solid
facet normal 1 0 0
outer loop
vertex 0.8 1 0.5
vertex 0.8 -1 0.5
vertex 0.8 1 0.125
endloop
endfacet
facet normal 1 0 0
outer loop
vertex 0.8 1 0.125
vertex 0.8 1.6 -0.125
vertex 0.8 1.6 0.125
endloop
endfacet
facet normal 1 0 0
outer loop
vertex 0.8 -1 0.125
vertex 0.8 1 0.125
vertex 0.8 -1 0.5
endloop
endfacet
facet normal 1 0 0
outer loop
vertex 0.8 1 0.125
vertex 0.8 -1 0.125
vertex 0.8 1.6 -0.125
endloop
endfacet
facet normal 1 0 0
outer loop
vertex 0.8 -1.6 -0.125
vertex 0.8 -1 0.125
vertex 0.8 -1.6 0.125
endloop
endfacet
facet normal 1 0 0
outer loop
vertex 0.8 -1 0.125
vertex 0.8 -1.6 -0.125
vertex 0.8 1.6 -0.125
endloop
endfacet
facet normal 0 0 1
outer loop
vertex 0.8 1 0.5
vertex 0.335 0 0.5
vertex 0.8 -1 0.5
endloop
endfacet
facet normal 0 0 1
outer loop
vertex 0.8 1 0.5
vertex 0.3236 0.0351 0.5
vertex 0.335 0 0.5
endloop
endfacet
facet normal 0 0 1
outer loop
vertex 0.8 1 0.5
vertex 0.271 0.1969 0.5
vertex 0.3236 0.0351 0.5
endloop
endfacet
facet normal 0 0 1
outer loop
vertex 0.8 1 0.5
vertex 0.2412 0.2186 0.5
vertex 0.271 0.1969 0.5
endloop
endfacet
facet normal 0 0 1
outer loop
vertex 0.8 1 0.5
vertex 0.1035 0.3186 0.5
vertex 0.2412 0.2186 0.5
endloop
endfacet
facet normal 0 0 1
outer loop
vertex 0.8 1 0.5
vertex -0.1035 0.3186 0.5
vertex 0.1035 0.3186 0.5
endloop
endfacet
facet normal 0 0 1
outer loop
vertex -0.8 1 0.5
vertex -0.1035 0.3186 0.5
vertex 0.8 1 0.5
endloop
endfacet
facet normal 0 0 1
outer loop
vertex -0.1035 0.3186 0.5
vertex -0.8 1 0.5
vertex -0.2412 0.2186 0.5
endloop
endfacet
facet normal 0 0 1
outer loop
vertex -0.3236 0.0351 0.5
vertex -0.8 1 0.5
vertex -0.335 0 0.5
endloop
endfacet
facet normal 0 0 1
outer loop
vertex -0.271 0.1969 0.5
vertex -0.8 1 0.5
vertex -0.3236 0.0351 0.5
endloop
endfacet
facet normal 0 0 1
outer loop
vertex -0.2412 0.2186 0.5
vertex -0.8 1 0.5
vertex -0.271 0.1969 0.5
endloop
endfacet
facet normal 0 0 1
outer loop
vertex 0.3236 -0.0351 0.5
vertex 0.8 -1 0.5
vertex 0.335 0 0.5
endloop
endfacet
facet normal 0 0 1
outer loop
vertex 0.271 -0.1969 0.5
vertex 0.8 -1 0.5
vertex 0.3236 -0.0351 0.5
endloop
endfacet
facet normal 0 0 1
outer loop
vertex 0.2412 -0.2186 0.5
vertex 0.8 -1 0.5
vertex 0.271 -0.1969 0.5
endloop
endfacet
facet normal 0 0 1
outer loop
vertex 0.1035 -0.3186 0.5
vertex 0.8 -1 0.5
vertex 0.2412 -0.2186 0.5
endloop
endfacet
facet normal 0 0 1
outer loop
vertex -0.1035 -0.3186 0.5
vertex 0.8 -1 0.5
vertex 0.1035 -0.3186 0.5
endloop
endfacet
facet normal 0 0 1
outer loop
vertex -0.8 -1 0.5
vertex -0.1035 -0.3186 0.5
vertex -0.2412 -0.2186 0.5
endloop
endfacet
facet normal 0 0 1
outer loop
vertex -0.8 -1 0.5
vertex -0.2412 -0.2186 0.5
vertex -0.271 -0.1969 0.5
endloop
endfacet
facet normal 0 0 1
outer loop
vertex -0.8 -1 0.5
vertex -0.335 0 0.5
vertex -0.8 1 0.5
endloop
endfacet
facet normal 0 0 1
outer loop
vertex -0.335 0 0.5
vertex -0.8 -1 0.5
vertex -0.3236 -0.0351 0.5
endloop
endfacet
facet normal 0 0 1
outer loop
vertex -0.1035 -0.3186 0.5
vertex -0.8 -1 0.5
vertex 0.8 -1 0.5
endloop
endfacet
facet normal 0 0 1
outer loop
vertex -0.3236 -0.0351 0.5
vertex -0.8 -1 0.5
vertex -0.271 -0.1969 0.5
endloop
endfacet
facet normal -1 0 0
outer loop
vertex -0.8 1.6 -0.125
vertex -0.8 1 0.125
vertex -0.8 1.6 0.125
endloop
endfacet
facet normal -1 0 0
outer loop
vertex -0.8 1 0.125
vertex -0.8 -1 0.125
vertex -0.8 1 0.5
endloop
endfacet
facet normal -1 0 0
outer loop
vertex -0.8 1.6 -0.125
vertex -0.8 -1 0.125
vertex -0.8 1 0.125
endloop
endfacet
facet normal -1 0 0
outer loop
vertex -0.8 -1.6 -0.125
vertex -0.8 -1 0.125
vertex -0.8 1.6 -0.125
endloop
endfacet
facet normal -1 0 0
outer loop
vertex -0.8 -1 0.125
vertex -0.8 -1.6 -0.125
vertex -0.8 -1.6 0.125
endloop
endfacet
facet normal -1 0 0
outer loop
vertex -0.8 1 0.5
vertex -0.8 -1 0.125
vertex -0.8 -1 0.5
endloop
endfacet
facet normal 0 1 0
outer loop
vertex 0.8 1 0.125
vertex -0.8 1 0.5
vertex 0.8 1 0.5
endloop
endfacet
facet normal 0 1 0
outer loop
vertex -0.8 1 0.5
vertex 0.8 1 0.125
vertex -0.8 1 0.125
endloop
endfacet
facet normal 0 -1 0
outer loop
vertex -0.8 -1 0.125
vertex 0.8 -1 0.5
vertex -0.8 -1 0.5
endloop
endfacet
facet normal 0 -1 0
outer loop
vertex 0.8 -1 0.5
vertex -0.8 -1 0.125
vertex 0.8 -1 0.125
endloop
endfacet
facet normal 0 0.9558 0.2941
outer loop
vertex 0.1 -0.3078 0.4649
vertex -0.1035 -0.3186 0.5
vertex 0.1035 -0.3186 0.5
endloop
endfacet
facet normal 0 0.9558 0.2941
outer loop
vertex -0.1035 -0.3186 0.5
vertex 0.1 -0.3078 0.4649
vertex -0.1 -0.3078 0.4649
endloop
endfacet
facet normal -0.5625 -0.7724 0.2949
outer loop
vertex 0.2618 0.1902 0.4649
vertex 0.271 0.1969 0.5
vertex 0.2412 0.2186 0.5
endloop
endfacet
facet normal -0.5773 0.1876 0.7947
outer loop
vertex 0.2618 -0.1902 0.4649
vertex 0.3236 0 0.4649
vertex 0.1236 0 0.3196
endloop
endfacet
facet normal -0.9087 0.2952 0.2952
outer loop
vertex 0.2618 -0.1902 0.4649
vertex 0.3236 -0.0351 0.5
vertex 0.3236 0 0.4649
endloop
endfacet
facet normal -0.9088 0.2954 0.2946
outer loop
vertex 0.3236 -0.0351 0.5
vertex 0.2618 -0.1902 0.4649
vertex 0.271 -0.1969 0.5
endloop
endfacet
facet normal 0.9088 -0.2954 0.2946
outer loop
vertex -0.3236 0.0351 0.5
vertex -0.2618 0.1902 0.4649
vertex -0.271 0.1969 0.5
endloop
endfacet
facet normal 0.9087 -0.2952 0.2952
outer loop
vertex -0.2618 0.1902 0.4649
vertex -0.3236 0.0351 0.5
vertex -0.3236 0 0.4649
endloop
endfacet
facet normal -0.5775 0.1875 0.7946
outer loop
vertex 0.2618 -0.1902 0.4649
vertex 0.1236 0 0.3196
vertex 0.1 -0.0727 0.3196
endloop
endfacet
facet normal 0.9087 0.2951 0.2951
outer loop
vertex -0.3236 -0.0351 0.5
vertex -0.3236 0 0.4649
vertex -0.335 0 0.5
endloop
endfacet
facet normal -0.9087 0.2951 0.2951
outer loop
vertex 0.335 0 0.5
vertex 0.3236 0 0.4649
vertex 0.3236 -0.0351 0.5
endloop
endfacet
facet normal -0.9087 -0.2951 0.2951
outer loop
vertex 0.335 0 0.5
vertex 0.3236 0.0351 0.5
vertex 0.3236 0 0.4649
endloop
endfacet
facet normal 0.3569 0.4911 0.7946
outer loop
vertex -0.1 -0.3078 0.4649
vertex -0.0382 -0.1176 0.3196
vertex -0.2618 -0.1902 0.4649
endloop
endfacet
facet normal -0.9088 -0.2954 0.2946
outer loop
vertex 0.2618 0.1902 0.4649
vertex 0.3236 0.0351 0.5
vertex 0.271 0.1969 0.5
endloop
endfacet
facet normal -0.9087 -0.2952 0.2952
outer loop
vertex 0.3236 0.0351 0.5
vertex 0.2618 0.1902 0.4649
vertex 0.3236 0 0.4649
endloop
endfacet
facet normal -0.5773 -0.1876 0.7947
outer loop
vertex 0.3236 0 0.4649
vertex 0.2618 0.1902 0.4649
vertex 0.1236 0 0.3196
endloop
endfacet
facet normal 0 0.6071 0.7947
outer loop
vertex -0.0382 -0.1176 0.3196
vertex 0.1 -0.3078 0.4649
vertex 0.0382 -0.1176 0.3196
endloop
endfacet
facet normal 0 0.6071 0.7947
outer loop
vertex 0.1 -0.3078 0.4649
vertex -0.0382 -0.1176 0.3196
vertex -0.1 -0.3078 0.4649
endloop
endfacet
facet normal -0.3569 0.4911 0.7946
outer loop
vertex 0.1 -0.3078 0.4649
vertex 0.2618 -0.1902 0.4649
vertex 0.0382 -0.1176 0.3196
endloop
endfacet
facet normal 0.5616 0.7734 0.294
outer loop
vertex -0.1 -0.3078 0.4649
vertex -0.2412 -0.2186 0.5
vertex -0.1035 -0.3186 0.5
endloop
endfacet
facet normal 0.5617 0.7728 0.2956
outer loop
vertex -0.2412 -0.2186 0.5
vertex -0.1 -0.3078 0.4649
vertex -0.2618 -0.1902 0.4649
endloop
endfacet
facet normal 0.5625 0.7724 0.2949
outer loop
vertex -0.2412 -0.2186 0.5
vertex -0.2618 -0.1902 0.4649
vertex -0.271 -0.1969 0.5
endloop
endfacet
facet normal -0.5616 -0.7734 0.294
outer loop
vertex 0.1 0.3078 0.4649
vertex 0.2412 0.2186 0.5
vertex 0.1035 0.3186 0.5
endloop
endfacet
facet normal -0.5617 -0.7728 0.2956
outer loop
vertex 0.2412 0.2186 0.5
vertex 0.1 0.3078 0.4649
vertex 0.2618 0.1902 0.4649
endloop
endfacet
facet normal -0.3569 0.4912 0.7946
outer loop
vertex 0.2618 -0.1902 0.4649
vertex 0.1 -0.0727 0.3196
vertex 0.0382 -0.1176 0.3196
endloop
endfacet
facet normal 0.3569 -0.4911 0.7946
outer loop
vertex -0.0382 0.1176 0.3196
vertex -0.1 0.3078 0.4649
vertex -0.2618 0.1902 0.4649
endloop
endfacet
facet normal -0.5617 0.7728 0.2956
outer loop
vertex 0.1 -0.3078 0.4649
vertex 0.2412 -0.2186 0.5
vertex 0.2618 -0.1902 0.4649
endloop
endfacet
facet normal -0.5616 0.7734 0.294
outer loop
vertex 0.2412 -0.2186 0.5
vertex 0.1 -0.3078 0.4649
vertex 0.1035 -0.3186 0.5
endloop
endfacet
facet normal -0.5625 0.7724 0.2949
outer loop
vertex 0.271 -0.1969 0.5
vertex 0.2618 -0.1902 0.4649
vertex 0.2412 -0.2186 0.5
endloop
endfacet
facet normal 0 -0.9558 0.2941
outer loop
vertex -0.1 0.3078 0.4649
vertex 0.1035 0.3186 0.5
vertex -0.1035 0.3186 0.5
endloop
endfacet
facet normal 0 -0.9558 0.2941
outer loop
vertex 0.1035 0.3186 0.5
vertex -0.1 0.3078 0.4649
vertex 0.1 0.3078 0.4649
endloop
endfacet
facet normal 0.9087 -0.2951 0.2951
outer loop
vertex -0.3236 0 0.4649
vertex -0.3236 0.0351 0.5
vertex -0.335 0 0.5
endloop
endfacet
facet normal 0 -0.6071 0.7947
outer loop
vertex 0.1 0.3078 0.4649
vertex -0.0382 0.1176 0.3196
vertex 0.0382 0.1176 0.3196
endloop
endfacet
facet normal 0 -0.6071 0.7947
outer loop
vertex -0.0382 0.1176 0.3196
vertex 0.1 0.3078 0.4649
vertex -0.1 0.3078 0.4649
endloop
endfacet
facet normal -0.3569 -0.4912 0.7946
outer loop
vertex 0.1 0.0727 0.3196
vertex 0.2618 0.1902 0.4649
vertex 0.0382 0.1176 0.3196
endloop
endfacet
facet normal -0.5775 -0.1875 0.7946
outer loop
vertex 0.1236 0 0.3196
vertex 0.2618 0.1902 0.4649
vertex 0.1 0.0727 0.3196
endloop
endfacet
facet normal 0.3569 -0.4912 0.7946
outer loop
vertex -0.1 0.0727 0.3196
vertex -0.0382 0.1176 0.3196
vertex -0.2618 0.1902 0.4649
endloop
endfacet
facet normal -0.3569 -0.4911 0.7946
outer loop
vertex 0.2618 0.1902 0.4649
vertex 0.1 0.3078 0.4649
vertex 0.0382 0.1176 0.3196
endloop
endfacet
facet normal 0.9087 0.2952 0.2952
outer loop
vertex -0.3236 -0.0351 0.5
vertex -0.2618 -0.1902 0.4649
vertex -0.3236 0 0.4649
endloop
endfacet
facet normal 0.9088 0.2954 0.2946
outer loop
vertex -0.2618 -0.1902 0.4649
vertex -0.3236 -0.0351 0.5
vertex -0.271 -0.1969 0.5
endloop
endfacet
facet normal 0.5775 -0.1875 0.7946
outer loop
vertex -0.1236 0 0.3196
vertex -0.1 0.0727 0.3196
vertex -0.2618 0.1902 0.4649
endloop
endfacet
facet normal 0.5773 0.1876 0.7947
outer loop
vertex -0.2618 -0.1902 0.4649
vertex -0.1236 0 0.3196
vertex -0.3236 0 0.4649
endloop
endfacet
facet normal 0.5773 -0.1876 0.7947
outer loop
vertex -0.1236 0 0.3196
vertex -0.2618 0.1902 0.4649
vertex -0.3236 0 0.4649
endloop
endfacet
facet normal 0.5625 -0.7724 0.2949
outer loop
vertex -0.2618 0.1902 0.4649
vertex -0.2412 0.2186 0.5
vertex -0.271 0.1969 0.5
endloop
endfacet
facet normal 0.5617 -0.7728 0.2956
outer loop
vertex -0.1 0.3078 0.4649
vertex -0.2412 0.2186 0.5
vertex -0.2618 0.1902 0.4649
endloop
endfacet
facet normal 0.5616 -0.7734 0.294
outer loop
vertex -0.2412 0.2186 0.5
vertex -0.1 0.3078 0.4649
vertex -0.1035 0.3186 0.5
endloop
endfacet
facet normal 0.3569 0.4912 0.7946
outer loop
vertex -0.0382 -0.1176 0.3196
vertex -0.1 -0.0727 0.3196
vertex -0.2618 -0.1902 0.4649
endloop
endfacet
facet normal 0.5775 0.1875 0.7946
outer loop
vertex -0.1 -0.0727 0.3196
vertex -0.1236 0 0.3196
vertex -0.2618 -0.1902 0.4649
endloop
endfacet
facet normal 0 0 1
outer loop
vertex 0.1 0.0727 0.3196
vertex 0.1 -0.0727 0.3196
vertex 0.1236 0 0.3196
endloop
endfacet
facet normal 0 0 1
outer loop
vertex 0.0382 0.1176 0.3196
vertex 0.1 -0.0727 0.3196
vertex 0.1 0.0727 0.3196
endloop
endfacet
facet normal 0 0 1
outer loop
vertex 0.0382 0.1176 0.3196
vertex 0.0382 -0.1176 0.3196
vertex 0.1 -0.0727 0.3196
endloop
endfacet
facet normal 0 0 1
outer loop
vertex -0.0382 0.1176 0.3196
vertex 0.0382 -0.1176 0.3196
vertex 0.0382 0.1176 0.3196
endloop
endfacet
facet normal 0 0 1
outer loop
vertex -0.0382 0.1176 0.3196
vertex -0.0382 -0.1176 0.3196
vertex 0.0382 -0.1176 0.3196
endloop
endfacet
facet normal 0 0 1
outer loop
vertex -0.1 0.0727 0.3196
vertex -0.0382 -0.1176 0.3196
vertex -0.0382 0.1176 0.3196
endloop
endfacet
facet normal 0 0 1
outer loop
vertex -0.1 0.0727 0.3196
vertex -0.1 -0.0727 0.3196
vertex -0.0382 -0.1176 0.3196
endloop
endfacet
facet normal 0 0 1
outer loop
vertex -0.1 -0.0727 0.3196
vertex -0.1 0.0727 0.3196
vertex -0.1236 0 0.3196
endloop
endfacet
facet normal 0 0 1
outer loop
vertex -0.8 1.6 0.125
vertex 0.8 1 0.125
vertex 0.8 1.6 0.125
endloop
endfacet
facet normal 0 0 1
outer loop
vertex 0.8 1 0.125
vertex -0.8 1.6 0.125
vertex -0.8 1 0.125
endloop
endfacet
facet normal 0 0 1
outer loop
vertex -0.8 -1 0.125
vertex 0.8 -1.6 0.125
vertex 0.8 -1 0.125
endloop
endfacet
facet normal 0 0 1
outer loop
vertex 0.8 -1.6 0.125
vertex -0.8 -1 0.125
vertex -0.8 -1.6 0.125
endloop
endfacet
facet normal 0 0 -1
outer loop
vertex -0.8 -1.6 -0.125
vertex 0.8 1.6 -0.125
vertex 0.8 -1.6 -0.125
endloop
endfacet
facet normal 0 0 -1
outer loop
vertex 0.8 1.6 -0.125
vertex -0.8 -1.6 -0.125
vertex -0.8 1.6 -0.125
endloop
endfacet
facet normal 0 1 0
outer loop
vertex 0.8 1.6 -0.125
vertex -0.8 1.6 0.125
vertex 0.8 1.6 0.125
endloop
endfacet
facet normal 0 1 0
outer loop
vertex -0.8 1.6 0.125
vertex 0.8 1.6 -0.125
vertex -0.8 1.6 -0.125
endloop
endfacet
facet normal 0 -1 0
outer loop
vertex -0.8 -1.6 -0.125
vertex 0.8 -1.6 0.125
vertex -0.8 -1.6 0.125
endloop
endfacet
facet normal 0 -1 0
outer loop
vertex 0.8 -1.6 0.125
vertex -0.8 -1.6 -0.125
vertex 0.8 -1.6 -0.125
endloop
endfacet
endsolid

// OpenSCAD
/*
 * Creates a 1206 size LED
 *
 * Author: Ian McInerney
 * Created: June 21, 2013
 */

// The base of the LED
cube(size=[1.6,3.2,0.25], center=true);


// Create the center lens thing
difference() {
	// The lens of the LED
	translate([0,0,0.25])cube(size=[1.6,2,0.5], center=true);

	// The bump in the middle of the LED
	translate([0,0,0.70])sphere(r=0.4, center=true, $fn=10);
}
